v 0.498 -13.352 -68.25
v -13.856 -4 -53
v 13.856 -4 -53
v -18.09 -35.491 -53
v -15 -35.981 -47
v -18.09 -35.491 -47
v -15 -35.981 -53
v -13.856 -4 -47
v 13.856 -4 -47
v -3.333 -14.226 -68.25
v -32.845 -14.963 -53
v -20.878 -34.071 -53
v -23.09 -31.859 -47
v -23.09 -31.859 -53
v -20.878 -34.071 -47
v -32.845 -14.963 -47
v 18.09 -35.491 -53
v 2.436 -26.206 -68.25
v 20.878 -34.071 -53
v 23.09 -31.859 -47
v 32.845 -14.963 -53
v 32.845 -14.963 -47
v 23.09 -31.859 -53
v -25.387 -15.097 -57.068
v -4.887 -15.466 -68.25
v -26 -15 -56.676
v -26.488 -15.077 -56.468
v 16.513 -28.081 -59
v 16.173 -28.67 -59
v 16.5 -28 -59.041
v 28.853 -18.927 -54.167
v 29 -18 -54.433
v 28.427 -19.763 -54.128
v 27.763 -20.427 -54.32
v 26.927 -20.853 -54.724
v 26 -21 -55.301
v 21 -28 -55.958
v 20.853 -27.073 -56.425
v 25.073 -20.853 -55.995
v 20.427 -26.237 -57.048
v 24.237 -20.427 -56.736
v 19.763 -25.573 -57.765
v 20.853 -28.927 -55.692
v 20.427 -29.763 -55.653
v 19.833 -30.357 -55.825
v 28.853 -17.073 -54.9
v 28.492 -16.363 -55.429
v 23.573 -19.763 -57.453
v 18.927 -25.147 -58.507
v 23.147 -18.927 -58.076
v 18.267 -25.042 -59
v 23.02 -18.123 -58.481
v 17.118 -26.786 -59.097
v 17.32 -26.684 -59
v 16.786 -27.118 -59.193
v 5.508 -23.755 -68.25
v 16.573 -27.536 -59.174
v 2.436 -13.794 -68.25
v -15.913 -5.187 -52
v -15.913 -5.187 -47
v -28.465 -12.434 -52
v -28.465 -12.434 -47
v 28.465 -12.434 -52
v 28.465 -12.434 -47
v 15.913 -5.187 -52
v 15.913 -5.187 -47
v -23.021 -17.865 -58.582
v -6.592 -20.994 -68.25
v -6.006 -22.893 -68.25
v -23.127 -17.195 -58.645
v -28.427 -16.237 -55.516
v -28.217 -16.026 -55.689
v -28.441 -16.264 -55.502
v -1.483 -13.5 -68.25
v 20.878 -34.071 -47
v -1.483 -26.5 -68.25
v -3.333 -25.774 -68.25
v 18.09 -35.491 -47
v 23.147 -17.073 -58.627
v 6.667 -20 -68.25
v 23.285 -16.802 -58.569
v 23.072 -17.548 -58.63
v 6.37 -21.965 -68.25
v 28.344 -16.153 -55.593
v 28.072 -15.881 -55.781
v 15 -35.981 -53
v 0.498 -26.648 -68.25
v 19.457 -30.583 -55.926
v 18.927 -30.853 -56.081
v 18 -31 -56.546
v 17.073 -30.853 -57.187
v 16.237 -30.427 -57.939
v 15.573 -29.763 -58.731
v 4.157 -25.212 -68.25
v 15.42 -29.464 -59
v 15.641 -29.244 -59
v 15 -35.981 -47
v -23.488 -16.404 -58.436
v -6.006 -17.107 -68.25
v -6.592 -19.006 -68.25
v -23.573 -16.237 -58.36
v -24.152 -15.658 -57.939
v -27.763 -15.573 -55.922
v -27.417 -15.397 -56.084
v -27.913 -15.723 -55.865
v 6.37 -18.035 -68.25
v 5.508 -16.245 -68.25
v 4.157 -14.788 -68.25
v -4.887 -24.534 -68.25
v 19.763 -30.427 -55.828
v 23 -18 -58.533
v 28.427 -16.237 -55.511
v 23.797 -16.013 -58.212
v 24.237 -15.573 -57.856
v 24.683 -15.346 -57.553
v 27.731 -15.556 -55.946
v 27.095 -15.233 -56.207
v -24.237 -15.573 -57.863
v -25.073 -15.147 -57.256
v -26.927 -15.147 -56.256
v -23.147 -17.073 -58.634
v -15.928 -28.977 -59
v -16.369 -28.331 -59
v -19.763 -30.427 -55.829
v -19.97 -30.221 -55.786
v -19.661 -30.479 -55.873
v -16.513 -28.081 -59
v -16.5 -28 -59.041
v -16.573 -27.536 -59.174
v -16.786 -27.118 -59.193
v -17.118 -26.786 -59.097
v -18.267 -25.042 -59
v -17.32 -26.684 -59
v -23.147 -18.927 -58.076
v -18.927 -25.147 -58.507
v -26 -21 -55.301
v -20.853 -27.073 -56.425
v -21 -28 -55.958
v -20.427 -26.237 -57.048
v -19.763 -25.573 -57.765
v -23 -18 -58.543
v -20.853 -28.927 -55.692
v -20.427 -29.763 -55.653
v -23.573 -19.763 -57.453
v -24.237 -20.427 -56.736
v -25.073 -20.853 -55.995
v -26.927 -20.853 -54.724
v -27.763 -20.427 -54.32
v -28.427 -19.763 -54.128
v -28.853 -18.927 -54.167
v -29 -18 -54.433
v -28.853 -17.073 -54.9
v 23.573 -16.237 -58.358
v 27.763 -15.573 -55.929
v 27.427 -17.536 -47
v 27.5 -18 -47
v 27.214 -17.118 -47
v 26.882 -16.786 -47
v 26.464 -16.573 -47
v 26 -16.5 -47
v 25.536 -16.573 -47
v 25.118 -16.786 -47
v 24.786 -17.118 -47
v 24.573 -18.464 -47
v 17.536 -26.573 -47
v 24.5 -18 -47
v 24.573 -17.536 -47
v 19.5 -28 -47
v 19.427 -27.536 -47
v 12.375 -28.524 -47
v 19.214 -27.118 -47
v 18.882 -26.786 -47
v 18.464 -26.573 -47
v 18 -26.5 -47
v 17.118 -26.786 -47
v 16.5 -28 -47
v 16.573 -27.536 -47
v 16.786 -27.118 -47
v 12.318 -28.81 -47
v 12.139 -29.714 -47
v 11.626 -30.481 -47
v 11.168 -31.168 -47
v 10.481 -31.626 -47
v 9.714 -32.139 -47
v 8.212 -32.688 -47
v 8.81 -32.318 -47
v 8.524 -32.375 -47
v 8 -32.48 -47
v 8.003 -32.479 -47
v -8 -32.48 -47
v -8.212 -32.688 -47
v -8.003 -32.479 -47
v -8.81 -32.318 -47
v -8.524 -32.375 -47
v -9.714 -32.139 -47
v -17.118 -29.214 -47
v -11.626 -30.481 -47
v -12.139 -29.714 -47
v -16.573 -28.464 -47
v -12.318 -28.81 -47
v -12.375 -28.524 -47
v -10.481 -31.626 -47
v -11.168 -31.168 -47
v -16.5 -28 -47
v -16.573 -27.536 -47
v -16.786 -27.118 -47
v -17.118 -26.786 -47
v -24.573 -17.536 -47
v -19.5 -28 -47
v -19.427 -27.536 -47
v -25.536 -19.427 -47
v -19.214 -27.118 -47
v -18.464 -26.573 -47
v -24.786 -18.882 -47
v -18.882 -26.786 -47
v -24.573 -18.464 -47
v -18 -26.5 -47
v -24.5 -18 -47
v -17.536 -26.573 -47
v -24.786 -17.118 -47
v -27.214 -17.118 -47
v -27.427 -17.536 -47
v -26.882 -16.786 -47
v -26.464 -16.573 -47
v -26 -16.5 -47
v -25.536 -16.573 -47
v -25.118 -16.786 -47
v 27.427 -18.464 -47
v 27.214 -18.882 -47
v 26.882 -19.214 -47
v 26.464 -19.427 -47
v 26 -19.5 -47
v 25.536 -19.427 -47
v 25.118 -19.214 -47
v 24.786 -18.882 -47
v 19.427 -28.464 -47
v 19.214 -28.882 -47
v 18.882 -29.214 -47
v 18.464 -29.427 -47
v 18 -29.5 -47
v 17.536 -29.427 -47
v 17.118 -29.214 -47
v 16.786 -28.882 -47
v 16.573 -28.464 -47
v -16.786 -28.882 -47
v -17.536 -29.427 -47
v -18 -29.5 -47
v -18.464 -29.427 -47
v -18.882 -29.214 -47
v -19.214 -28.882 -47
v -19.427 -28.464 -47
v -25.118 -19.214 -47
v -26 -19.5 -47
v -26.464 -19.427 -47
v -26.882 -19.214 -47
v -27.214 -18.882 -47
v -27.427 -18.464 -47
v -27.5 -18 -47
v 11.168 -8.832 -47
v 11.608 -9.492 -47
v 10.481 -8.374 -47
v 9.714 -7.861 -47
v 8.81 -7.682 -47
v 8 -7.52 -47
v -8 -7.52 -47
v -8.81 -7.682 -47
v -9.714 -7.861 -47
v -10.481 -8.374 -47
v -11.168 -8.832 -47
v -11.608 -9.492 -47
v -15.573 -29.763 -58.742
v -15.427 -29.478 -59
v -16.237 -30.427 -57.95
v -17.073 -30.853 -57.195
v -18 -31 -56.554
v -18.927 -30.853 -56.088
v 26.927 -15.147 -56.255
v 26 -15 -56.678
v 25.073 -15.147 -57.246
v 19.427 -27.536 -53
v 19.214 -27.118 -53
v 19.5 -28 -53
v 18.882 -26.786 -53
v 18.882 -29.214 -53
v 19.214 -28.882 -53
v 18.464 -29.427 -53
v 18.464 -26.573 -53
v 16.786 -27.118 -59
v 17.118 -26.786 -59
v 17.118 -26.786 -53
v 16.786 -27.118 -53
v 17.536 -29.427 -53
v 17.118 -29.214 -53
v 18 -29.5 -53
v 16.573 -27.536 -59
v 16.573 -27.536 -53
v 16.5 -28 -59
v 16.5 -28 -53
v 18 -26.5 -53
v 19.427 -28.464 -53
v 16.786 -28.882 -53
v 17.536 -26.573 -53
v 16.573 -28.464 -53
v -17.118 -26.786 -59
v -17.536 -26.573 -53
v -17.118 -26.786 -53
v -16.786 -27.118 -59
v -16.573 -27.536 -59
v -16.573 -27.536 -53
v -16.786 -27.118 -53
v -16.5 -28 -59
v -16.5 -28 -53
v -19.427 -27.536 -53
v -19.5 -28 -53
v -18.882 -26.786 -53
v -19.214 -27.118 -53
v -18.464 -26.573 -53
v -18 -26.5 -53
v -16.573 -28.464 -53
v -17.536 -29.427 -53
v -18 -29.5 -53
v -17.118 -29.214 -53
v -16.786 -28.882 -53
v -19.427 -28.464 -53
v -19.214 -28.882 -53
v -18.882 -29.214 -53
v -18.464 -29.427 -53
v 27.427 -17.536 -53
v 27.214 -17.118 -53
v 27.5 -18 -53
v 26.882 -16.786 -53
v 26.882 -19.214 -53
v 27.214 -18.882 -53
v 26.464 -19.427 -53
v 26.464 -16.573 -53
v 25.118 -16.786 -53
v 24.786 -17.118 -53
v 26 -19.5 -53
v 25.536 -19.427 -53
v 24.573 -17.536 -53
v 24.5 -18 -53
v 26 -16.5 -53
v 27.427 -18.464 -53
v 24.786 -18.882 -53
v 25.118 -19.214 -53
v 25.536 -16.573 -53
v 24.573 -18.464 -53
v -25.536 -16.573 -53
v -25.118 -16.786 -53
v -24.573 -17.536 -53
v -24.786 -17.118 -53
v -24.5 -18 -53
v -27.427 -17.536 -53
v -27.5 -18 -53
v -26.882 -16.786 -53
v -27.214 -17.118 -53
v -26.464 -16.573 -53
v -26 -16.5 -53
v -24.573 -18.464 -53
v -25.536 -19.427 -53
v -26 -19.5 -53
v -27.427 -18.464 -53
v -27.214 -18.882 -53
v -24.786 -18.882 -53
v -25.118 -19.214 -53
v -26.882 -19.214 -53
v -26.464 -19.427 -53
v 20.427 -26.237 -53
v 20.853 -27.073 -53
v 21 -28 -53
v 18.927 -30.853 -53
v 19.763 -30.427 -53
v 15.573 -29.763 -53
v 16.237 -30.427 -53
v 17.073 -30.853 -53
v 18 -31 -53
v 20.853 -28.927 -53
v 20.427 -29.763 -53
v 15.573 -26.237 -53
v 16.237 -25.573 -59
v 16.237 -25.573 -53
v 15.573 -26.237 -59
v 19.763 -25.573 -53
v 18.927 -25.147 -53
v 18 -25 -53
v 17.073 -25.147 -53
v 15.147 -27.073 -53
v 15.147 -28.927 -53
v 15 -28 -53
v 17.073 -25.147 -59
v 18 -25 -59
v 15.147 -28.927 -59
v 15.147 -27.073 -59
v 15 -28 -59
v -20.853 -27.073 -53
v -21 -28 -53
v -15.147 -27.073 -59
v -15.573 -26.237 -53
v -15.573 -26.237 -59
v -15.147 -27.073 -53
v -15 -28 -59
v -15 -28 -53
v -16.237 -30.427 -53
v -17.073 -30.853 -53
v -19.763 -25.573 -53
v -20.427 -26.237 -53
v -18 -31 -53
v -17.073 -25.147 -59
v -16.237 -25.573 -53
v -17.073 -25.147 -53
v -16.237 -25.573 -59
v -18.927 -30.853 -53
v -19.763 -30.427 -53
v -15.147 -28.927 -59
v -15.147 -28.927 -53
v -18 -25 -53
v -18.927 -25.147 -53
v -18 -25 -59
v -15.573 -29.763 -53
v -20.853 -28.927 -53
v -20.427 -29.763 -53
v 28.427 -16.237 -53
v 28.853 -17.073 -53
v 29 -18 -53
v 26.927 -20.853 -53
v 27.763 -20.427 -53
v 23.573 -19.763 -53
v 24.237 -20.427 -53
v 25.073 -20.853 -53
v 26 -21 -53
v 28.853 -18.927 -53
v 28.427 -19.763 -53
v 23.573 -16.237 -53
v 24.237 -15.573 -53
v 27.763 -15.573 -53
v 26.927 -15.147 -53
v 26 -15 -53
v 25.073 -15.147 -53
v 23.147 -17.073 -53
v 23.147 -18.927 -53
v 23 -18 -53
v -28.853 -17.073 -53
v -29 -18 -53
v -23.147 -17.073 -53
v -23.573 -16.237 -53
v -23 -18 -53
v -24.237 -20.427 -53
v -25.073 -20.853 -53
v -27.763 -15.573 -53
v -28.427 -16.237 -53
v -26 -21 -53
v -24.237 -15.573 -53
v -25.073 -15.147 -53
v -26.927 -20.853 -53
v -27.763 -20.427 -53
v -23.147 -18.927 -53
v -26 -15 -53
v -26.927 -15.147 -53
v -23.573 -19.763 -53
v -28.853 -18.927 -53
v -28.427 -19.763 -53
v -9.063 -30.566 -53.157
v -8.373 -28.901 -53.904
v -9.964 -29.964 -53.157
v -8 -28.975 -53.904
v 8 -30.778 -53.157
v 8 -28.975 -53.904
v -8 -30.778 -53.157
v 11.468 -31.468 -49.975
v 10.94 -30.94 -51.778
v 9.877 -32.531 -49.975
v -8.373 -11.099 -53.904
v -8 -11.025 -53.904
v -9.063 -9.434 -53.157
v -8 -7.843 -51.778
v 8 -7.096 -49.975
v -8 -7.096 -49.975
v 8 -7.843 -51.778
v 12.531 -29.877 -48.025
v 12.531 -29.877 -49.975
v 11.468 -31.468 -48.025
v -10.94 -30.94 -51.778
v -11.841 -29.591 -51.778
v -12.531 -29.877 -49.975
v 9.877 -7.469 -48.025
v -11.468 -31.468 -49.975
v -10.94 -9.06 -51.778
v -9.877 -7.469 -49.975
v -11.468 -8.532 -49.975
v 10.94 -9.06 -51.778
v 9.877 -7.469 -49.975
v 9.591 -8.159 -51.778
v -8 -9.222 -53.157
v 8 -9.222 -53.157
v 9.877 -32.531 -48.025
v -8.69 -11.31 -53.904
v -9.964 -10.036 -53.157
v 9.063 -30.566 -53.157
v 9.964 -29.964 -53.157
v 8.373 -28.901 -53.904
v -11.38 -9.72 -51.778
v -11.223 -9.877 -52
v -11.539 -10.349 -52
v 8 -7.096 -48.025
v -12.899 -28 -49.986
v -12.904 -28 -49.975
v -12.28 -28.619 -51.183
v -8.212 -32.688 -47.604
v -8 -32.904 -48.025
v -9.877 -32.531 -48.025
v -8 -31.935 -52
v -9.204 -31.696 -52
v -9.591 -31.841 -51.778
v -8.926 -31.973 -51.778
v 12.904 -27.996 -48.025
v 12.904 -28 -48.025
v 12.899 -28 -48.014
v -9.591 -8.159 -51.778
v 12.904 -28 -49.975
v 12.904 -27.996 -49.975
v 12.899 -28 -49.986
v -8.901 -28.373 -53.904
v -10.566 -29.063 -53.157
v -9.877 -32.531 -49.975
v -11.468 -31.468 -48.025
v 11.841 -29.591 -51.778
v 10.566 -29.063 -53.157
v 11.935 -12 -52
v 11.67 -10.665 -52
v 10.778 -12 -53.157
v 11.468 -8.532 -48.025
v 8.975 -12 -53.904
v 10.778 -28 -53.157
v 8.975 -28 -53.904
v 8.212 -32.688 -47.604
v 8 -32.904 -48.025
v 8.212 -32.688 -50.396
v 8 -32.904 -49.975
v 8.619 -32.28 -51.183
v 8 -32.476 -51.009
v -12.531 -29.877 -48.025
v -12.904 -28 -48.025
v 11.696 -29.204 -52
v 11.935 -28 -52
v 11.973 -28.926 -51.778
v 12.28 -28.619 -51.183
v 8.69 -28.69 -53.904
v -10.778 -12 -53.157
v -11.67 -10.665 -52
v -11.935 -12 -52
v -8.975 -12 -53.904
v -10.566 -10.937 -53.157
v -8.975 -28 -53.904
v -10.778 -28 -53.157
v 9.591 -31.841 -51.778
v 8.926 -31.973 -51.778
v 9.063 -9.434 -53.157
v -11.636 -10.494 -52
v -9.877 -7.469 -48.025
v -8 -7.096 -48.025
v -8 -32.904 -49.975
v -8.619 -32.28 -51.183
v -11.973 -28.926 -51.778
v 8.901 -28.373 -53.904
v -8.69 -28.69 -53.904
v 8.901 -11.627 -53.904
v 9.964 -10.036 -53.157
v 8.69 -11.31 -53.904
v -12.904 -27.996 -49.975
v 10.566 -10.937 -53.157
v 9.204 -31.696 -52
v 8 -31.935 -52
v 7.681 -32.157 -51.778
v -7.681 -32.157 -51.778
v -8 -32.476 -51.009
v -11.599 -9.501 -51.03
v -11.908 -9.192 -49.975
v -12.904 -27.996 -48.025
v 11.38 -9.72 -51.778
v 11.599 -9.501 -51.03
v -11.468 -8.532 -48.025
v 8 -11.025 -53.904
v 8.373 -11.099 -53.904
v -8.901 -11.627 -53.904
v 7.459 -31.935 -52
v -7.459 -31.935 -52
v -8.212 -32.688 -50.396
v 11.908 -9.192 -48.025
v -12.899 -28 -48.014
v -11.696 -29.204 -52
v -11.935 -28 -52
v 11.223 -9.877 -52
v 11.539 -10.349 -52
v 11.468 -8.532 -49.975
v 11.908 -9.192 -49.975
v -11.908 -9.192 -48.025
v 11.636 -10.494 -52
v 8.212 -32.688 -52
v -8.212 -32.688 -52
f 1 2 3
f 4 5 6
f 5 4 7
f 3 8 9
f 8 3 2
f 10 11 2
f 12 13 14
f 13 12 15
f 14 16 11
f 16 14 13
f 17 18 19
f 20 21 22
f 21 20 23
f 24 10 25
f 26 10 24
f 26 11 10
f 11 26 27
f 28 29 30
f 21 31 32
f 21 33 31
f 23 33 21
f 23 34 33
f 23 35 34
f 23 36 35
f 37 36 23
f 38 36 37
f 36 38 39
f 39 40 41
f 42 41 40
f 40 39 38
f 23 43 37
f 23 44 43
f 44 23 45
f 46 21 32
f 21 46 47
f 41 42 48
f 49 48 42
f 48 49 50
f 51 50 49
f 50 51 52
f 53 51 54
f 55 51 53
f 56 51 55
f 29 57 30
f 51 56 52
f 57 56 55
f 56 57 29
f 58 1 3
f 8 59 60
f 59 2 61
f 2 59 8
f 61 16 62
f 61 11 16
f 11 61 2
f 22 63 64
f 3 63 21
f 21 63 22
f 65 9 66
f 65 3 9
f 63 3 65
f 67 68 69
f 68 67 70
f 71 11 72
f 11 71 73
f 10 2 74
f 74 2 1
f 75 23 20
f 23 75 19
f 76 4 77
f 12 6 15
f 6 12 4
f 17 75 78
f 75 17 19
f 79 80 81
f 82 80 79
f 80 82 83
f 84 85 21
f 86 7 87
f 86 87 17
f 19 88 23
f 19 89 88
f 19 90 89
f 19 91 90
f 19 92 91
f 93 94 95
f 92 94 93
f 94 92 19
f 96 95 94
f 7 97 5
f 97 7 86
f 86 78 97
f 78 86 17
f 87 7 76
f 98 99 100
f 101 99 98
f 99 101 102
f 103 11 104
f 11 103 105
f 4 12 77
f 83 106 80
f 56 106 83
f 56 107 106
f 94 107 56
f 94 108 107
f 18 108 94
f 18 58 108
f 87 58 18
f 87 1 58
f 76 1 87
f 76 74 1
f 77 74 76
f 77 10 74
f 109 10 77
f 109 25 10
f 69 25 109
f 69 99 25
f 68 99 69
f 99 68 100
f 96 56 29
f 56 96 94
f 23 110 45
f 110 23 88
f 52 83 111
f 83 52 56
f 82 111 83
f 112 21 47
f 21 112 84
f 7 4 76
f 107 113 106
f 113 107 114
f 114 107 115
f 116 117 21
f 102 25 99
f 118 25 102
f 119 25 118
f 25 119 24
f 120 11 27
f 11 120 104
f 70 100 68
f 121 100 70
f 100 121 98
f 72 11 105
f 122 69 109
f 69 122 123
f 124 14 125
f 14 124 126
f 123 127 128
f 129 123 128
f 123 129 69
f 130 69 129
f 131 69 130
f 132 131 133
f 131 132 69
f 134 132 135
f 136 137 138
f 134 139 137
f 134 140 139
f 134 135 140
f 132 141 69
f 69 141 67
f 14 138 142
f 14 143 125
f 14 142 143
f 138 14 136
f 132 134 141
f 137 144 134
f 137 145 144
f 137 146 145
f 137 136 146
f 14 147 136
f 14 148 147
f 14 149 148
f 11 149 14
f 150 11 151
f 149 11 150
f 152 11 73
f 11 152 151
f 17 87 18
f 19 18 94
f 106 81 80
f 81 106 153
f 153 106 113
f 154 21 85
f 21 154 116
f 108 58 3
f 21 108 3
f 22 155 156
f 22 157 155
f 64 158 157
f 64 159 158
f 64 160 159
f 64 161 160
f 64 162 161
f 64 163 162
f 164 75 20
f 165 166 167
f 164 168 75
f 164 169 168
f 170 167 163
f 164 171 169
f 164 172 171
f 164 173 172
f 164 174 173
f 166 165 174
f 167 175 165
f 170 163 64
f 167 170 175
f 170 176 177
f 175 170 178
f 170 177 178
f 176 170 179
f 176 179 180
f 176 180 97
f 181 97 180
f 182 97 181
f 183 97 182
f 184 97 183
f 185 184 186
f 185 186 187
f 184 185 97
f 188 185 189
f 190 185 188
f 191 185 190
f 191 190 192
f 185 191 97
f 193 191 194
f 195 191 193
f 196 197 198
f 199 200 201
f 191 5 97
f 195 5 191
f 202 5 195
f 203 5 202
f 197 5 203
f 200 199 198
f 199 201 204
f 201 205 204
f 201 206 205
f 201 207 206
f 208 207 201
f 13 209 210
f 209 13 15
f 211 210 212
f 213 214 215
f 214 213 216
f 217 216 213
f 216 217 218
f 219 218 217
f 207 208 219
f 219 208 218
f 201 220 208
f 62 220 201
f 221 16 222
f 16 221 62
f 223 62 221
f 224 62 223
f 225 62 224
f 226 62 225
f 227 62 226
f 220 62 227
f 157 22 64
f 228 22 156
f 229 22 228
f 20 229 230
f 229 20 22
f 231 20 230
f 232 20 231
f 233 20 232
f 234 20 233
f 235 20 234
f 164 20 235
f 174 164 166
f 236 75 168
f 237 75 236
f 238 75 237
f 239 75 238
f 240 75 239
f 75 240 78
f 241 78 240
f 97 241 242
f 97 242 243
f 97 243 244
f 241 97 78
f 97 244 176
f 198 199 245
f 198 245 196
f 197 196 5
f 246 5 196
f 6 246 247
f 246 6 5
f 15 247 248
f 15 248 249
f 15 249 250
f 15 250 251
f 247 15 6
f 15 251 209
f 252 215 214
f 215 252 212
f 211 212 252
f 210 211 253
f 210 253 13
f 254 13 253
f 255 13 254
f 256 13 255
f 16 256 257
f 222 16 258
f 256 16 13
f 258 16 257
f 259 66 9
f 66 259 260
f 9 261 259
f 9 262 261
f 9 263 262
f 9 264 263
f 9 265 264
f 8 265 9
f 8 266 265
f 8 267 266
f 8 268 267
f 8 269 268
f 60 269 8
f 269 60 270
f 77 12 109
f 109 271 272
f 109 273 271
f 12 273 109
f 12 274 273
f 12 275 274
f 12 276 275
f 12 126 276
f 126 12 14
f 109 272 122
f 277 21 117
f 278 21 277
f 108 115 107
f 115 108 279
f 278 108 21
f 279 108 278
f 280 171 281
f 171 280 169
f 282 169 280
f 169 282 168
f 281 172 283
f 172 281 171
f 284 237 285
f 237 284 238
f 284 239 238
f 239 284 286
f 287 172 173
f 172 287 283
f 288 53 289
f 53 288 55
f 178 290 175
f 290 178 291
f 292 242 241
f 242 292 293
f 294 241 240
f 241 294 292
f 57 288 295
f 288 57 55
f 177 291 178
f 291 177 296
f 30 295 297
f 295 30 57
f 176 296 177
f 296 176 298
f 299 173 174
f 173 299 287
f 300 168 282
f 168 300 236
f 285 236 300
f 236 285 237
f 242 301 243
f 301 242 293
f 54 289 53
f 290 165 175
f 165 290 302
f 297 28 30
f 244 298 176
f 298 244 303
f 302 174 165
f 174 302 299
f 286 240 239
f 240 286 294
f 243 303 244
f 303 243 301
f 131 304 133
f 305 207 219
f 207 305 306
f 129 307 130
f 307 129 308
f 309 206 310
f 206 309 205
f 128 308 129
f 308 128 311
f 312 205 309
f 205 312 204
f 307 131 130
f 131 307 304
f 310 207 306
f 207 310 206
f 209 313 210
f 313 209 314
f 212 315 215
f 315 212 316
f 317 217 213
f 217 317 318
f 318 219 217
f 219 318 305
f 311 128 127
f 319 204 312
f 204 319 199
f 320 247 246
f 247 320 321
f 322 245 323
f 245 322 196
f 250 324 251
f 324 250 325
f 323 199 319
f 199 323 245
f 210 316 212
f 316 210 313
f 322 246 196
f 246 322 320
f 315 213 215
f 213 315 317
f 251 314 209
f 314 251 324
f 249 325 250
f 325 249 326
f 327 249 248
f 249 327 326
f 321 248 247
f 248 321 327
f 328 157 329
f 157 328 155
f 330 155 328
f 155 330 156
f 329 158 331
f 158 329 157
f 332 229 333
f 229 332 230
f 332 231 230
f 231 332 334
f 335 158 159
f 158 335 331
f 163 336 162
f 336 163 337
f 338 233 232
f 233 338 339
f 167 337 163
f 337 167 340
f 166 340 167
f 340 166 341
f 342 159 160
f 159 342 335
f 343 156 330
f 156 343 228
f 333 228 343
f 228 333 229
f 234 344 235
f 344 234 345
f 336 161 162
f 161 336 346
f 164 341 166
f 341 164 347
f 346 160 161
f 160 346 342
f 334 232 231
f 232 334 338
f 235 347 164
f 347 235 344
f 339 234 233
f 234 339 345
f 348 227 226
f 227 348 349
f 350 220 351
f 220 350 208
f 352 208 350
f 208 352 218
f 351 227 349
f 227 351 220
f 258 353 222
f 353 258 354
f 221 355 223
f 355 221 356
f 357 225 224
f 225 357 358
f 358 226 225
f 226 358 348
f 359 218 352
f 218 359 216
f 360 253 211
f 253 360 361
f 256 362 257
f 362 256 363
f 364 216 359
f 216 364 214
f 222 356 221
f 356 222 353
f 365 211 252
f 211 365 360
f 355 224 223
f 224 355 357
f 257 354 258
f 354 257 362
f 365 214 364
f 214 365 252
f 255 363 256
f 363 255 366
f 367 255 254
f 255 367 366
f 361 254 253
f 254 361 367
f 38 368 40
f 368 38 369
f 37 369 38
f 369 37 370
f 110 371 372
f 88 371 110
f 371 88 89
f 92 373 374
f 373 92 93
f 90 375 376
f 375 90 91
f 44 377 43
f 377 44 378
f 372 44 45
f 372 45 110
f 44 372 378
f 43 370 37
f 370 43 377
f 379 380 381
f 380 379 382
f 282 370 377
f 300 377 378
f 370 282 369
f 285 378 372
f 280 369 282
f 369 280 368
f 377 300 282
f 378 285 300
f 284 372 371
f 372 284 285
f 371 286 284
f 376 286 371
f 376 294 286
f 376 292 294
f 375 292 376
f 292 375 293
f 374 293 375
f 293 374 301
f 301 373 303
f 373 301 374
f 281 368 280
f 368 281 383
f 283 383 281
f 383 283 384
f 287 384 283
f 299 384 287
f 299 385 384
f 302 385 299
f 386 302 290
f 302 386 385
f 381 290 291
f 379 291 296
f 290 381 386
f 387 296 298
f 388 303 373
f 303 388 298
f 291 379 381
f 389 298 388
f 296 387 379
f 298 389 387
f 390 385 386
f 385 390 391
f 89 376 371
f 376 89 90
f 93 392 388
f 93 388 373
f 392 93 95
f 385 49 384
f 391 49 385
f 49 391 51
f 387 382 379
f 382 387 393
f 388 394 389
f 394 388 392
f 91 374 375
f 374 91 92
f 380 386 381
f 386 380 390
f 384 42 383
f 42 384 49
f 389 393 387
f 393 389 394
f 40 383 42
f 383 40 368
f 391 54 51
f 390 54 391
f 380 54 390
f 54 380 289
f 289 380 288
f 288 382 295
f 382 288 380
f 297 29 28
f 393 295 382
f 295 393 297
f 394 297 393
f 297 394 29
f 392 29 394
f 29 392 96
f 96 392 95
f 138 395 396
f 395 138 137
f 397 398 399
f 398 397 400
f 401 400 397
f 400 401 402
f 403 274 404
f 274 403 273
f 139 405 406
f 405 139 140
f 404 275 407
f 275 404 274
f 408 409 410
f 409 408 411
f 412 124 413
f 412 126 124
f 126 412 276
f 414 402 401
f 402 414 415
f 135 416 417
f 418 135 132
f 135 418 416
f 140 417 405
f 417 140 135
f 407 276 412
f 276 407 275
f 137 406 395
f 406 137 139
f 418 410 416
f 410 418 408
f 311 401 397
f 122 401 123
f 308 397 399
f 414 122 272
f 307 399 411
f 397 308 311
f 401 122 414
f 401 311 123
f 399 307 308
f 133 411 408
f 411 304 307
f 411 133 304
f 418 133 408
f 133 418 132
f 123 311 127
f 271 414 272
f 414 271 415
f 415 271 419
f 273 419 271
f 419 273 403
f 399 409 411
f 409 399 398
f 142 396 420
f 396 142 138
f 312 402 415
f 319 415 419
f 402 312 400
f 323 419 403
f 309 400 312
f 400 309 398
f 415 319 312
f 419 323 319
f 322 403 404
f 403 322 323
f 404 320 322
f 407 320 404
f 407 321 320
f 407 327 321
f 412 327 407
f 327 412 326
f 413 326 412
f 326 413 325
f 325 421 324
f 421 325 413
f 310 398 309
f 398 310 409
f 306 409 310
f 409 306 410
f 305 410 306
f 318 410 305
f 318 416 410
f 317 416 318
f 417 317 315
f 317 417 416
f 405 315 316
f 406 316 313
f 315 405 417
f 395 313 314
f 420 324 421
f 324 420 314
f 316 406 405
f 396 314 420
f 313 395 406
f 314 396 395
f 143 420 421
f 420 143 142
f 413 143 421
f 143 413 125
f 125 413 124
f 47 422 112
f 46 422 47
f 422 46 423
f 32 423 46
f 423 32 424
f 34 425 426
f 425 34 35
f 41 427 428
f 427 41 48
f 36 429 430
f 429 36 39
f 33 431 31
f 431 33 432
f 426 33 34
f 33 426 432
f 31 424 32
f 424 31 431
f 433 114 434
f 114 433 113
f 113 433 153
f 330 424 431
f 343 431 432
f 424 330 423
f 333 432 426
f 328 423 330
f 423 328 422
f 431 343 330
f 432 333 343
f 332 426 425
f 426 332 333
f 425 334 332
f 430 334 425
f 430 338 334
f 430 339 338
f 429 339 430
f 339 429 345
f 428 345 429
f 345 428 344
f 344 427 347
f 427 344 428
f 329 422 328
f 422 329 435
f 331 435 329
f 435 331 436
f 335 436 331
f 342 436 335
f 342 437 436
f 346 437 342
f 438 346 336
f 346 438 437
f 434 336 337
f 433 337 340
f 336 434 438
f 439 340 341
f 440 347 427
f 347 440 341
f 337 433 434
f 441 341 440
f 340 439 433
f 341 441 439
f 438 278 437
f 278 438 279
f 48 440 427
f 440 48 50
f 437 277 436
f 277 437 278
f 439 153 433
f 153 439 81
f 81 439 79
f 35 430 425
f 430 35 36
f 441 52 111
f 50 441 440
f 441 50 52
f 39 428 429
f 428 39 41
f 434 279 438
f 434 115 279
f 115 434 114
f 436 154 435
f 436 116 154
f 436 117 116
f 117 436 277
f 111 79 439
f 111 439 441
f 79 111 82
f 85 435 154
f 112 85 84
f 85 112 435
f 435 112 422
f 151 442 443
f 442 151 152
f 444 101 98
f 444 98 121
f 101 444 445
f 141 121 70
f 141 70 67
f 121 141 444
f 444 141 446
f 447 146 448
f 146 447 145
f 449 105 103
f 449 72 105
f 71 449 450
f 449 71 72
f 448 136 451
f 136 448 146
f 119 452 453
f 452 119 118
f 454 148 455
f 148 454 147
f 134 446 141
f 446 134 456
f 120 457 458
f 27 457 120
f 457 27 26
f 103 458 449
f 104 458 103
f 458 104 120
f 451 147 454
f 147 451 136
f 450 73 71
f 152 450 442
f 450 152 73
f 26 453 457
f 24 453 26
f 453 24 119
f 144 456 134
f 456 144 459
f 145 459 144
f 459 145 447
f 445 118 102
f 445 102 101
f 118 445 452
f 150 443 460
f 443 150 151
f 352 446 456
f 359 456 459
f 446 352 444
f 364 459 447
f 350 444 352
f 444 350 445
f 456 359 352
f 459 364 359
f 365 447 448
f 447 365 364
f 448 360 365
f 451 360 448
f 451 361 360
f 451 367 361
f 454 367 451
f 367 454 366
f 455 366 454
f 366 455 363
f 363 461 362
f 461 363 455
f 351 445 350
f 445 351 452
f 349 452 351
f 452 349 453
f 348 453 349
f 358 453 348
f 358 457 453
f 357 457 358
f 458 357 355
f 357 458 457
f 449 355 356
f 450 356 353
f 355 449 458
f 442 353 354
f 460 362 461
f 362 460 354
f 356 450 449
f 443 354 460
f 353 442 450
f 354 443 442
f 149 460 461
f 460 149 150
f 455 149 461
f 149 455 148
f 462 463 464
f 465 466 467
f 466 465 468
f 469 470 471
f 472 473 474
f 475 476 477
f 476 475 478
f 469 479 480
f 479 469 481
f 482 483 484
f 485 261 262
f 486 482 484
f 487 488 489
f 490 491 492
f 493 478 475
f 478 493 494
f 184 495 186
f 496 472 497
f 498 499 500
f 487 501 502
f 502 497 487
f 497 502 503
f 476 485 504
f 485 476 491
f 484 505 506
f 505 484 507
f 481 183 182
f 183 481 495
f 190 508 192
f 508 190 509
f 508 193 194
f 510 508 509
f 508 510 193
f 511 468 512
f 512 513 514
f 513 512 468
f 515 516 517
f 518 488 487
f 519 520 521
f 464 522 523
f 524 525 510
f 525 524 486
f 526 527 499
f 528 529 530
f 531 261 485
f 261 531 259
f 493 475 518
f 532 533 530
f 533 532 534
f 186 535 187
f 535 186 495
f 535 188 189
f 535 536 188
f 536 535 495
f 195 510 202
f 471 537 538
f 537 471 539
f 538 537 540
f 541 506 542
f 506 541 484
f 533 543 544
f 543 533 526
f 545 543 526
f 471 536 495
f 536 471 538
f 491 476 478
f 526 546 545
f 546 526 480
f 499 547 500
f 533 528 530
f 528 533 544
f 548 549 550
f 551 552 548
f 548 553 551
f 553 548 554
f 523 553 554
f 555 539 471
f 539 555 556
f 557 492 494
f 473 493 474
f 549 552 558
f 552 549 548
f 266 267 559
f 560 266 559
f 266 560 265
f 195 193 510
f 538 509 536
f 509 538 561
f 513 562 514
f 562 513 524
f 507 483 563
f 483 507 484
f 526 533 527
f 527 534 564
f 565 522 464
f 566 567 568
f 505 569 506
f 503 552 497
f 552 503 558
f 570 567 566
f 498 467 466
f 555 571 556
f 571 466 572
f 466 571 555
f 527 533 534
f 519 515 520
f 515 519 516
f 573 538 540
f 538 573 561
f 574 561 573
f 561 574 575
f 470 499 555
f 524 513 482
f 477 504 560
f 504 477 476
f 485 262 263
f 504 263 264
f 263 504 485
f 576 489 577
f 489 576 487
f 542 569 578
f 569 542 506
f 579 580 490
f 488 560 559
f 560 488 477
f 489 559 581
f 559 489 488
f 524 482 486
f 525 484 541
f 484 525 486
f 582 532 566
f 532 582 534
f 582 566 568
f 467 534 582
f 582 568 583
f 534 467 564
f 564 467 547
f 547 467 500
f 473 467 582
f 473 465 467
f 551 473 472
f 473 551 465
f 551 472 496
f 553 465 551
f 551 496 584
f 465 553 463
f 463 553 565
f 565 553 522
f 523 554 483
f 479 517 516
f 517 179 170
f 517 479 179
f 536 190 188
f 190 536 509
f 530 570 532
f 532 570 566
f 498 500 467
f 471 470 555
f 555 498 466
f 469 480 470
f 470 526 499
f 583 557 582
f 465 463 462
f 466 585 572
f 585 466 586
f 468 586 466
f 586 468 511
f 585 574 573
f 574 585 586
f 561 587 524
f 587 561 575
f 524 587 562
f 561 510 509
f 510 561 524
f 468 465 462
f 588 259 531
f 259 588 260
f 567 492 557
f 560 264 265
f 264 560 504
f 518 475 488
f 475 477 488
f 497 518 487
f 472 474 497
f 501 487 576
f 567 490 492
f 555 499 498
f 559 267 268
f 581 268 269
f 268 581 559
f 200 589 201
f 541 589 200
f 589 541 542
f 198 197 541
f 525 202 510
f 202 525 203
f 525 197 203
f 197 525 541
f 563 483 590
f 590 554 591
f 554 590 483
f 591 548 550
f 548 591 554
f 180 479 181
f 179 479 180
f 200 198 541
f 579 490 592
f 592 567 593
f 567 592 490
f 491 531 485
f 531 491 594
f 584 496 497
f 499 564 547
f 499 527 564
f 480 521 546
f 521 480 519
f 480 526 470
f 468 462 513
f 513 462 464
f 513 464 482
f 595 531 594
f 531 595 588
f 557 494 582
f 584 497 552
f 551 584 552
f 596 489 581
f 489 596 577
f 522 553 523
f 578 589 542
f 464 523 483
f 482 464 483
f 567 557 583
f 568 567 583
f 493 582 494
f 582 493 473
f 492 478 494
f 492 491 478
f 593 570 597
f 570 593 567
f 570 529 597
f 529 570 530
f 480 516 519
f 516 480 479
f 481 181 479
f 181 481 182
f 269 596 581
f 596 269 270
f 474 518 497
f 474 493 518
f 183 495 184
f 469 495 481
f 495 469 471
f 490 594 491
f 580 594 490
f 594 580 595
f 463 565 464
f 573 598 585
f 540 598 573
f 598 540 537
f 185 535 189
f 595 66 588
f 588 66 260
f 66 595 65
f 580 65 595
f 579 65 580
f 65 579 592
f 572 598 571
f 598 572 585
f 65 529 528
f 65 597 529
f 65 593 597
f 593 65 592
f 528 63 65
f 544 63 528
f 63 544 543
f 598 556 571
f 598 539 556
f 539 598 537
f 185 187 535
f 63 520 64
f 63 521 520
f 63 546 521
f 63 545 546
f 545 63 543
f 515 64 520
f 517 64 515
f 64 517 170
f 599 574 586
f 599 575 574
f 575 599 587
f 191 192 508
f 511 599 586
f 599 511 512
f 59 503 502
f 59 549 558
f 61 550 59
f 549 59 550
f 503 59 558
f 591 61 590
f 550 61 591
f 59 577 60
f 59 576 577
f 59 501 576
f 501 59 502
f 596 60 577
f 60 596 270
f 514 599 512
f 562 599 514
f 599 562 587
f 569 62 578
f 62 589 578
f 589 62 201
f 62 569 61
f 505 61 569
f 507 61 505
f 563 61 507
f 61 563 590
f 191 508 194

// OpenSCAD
//This is based on the Atom 3dp design

extrusion = 20;
err = 0.2;
channelWidth= 4;
channelWidthInside=8.5;
channelDeep = 6;

outRoundness = .5*extrusion;
innerRoundness = 0.2*extrusion;
endRoundness = 0.08* extrusion;

armLength = extrusion * 2.7;


//height = extrusion;

sqrt3 = 1.7321;

m25ScrewRadius = 1.25; 

m4ScrewRadius = 2.0; //for M4 bolt
m4ScrewHeadRadius = 4.0; 
m4NutRadius = 4.3;

m5NutRadius = 8/sqrt3+0.2;

m3ScrewRadius = 1.5; //for M3 bolt
m3ScrewHeadRadius = 3.0; 
m3NutRadius = 3.5; //


module bottomCover(height){
    // draw the basic shape

    difference(){
	hull(){
	    intersection(){
		minkowski() {
		    cylinder(r=extrusion*1.5, h=0.3*height,  center=true,$fn=6);
		    cylinder(r=outRoundness, h=0.3*height, center=true, $fn=20);
		}
		translate([0,-extrusion*1.8,0]) rotate([0,0,30]) cylinder(r=extrusion*2,h=0.3*height, center=true, $fn=6);
		translate([0,-1.2*extrusion,0]) cube([4*extrusion, 2*extrusion, 2*height],center=true);
	    }
	    translate([0,-extrusion, -height*.9]) cylinder(r=extrusion/3,h=0.5,center=true);//cube([extrusion+5, extrusion+5, 0.5],center=true);
	}
    
	// leave holes for m3 screws
	translate([0.9*extrusion, -1.4*extrusion,0]) cylinder(r=m3ScrewRadius, h=extrusion, center=true, $fn=20);
	translate([-0.9*extrusion, -1.4*extrusion,0]) cylinder(r=m3ScrewRadius, h=extrusion, center=true, $fn=20);
	translate([1.3*extrusion, -0.9*extrusion,0]) cylinder(r=m3ScrewRadius, h=extrusion, center=true, $fn=20);
	translate([-1.3*extrusion, -0.9*extrusion,0]) cylinder(r=m3ScrewRadius, h=extrusion, center=true, $fn=20);

	// Leave holes for m3 head

	translate([0.9*extrusion, -1.4*extrusion,-.3*extrusion]) cylinder(r=m3ScrewHeadRadius, h=extrusion*.3, center=true, $fn=20);
	translate([-0.9*extrusion, -1.4*extrusion,-.3*extrusion]) cylinder(r=m3ScrewHeadRadius, h=extrusion*.3, center=true, $fn=20);
	translate([1.3*extrusion, -0.9*extrusion,-.3*extrusion]) cylinder(r=m3ScrewHeadRadius, h=extrusion*.3, center=true, $fn=20);
	translate([-1.3*extrusion, -0.9*extrusion,-.3*extrusion]) cylinder(r=m3ScrewHeadRadius, h=extrusion*.3, center=true, $fn=20);

	// Leave space for wiring

	translate([0,-extrusion,0.15*extrusion])
	hull(){
	    for(i=[0:90:270])
	    rotate([0,0,i]) translate([extrusion*.4,extrusion*.4,-2])sphere(r=0.25*extrusion, center=true);

	    //translate([0, -extrusion*.5,0.17*extrusion]) scale([1,1.3,0.5])sphere(r=0.34*extrusion, center=true);
	    //	    translate([0.7*extrusion,-0.6*extrusion,channelDeep/2-1])cube([extrusion,channelWidth*2, channelDeep],center=true);
	    //	    translate([-0.7*extrusion,-0.6*extrusion,channelDeep/2-1])cube([extrusion,channelWidth*2, channelDeep],center=true);
	    
	}

	translate([0.75*extrusion,-0.8*extrusion,channelDeep/2-2]) rotate([0,0,45])
	cube([1.66*extrusion,channelWidth*3.5, channelDeep],center=true);
	
	translate([-0.75*extrusion,-0.8*extrusion,channelDeep/2-2]) rotate([0,0,-45])
	cube([1.66*extrusion,channelWidth*3.5, channelDeep],center=true);


//translate([0,0.3*extrusion,0.1*extrusion]) cube([0.5*extrusion,2*extrusion,0.2*extrusion],center=true);
	translate([0, extrusion, 0]) rotate([10,0,0])cube([0.5*extrusion, extrusion*1.5, 0.2*extrusion],center=true);

	
    }

}



module topCover(height){
    // draw the basic shape
    intersection(){
	// to give a nicer cover
	translate([0,-extrusion,0])
	union(){
	    //translate([0,1,0])cylinder(r=0.9*extrusion, h=extrusion,center=true,$fn=30);
	    translate([0,-0.25*extrusion,0])cube([4*extrusion,2*extrusion,extrusion],center=true);
	}

	// real main shape
	difference(){
	    hull(){
		intersection(){
		    minkowski() {
			cylinder(r=extrusion*1.5, h=0.3*height,  center=true,$fn=6);
			cylinder(r=outRoundness, h=0.3*height, center=true, $fn=20);
		    }
		    translate([0,-extrusion*1.8,0]) rotate([0,0,30]) cylinder(r=extrusion*2,h=0.3*height, center=true, $fn=6);
		}
		translate([0,-extrusion, height*.6]) cylinder(r=extrusion*.6,h=0.5,center=true);//cube([extrusion+5, extrusion+5, 0.5],center=true);
		
	    }
	    // leave holes for m3 screws
	    translate([0.9*extrusion, -1.4*extrusion,0]) cylinder(r=m3ScrewRadius, h=extrusion, center=true, $fn=20);
	    translate([-0.9*extrusion, -1.4*extrusion,0]) cylinder(r=m3ScrewRadius, h=extrusion, center=true, $fn=20);
	    translate([1.3*extrusion, -0.9*extrusion,0]) cylinder(r=m3ScrewRadius, h=extrusion, center=true, $fn=20);
	    translate([-1.3*extrusion, -0.9*extrusion,0]) cylinder(r=m3ScrewRadius, h=extrusion, center=true, $fn=20);
	    
	    // Leave holes for m3 head
	    
	    translate([0.9*extrusion, -1.4*extrusion,.7*height]) cylinder(r=m3ScrewHeadRadius, h=extrusion*.3, center=true, $fn=20);
	    translate([-0.9*extrusion, -1.4*extrusion,.7*height]) cylinder(r=m3ScrewHeadRadius, h=extrusion*.3, center=true, $fn=20);
	    translate([1.3*extrusion, -0.9*extrusion,.7*height]) cylinder(r=m3ScrewHeadRadius, h=extrusion*.3, center=true, $fn=20);
	    translate([-1.3*extrusion, -0.9*extrusion,.7*height]) cylinder(r=m3ScrewHeadRadius, h=extrusion*.3, center=true, $fn=20);
	    
	    // Leave space for wiring
	    
	    translate([0,-extrusion,0])
	    for(i=[0:90:270])
	    rotate([0,0,i]) translate([extrusion*.45,extrusion*.45,-.7*height])sphere(r=0.27*extrusion, center=true);

	    translate([0, -extrusion*.5, -.5*height]) sphere(r=0.3*extrusion, center=true);
	    
	}
    }
}


module frameShape(height){
    union(){
	// vertex side
	intersection(){
	    minkowski() {
		cylinder(r=extrusion*1.5, h=height, center=true,$fn=6);
		cylinder(r=outRoundness, h=height, center=true, $fn=20);
	    }
	    translate([0,-extrusion*1.8,0]) rotate([0,0,30]) cylinder(r=extrusion*2, h=height,center=true, $fn=6);
	}

	// V part
	translate([0,armLength-1.6*extrusion,0]) rotate([0,0,30])
	minkowski(){
	    cylinder(r=armLength-endRoundness*2, h=height-1, center=true, $fn=3);
	    cylinder(r=endRoundness, h=1, center=true, $fn=20);
	}

	// bump
//	bump(height);
    }
}

module extrusion(length){
    difference(){
	cube([extrusion+0.2,extrusion+0.2, length], center=true);
	for(i=[0:90:270]) 
	rotate([0,0,i]) translate([extrusion/2,0,0]) cube([channelWidth-err,channelWidth-err, length], center=true);
    }
    for (i=[0:90:270])
    rotate([0,0,i])translate([extrusion/2,extrusion/2,0])cylinder(r=1,h=length,center=true);

}

module frameGeneral(height){
//    union(){
	difference(){
	    frameShape(height);
	    
	    // vertical extrusion place
	    translate([0,-extrusion,0]) extrusion(height+100);
	    // dig hole for belt or gear
	    
	    translate([0, .5*extrusion,0])
	    minkowski(){
		intersection(){
		    rotate([0,0,30]) cylinder(r=1.1*extrusion, h=height*2,center=true, $fn=3);
		    cube([extrusion*2,  extrusion, height*2],center=true);
		}
		cylinder(r=innerRoundness, h=height, center=true, $fn=20);
		
	    }
	    
	    // make V shape branches
	    translate([0, 2.2*extrusion,0])
	    minkowski(){
		intersection(){
		    rotate([0,0,30]) cylinder(r=extrusion*2.8, h=height,center=true, $fn=3);
		    cube([extrusion*5,  extrusion, height],center=true);
		}
		cylinder(r=innerRoundness, h=height, center=true, $fn=20);
	    }
	}
	
   // }

}

//%rotate([0,0, -30]) translate([1.3*extrusion,2.7*extrusion,0]) rotate([90,0,0]) extrusion(100);//cube([extrusion, 100, extrusion]);
//%rotate([0,0, 30]) translate([-1.3*extrusion,2.7*extrusion,0]) rotate([90,0,0]) extrusion(100);


module frame_top(){
    difference(){
	union(){
	    frameGeneral(extrusion);
	    
	    // add bumps for bearing
	    intersection(){
		rotate([-90,0,0]) cylinder(r1 = extrusion*.8, r2=0.1*extrusion, h= 0.6*extrusion,center=true);
		cube([2*extrusion, 2* extrusion, extrusion],center=true);
	    }
	    translate([0,extrusion*1.15,0]) intersection(){
		rotate([90,0,0]) cylinder(r1 = extrusion*.6, r2=0.1*extrusion, h= 0.4*extrusion,center=true);
		cube([2*extrusion, 2* extrusion, extrusion],center=true);
	    }
	    
	    // add horizontal bumps strips
	    rotate([0,0,-30])translate([extrusion*.75,0,0])rotate([-90,0,0])cylinder(r=channelWidth/2+err, h=3.2*extrusion,$fn=20);
	    rotate([0,0,30])translate([-extrusion*.75,0,0])rotate([-90,0,0])cylinder(r=channelWidth/2+err, h=3.2*extrusion,$fn=20);
	}

	// leave m3 screw
	rotate([-90,0,0]) cylinder(r=m3ScrewRadius, h=3*extrusion, $fn=20);
	rotate([-90,0,0]) translate([0,0, 1.5*extrusion-3.5]) cylinder(r=m3ScrewHeadRadius, h=3.6,$fn=20);

	// Vertical extrusion mounting M4 screws
	translate([0, -extrusion,0])rotate([90,0,0]) cylinder(r=m4ScrewRadius, h= extrusion, $fn=20);
	translate([0, -1.6*extrusion,0])rotate([90,0,0]) cylinder(r=m4ScrewHeadRadius, h= 4, $fn=20);
	translate([0, -1.3*extrusion,0])rotate([90,0,0]) cylinder(r=m4NutRadius+0.5, h= 4, $fn=6);

	// Aluminum mount screws
	rotate([0,0,30]){
	    translate([-extrusion,0.7*extrusion,0])rotate([0,90,0]) cylinder(r=m4ScrewRadius, h = extrusion, $fn=20);
	    translate([-0.65*extrusion,0.7*extrusion,0])rotate([0,90,0]) cylinder(r=m4ScrewHeadRadius, h = 4, $fn=20);
	    translate([-1.02*extrusion,0.7*extrusion,0])rotate([0,90,0]) cylinder(r=m4NutRadius, h = 4, $fn=6);
	    
	    translate([-extrusion,2.8*extrusion,0])rotate([0,90,0]) cylinder(r=m4ScrewRadius, h = extrusion, $fn=20);
	    translate([-0.65*extrusion,2.8*extrusion,0])rotate([0,90,0]) cylinder(r=m4ScrewHeadRadius, h = 4, $fn=20);
	    translate([-1.02*extrusion,2.8*extrusion,0])rotate([0,90,0]) cylinder(r=m4NutRadius, h = 4, $fn=6);
	}


	rotate([0,0,-30]){
	    translate([extrusion,0.7*extrusion,0])rotate([0,-90,0]) cylinder(r=m4ScrewRadius, h = extrusion, $fn=20);
	    translate([0.65*extrusion,0.7*extrusion,0])rotate([0,-90,0]) cylinder(r=m4ScrewHeadRadius, h = 4, $fn=20);
	    translate([1.02*extrusion,0.7*extrusion,0])rotate([0,-90,0]) cylinder(r=m4NutRadius, h = 4, $fn=6);
	    
	    translate([extrusion,2.8*extrusion,0])rotate([0,-90,0]) cylinder(r=m4ScrewRadius, h = extrusion, $fn=20);
	    translate([0.65*extrusion,2.8*extrusion,0])rotate([0,-90,0]) cylinder(r=m4ScrewHeadRadius, h = 4, $fn=20);
	    translate([1.02*extrusion,2.8*extrusion,0])rotate([0,-90,0]) cylinder(r=m4NutRadius, h = 4, $fn=6);
	}

	// long m3 screw
	translate([0,-0.4*extrusion,0])rotate([13,0,0]){
	    cylinder(r=m3ScrewRadius, h= 2*extrusion, center=true,$fn=20);
	    translate([0,0,0.5*extrusion])cylinder(r=m3ScrewHeadRadius, h=5, center=true, $fn=20);
	    translate([0,0,-0.45*extrusion])cylinder(r=m3NutRadius+err, h=0.5*extrusion, center=true, $fn=6);
	}

	// slots for putting nuts

	rotate([0,0,-30])translate([1.3*extrusion,extrusion*.5,extrusion/2-channelDeep/2+1]){
	    translate([0,-extrusion/2,0])cylinder(r=channelWidthInside/2, h= channelDeep,center=true);
	    cube([channelWidthInside, extrusion,channelDeep],center=true);
	}

    	rotate([0,0,-30])translate([1.3*extrusion,extrusion*.5,-extrusion/2+channelDeep/2-1]){
	    translate([0,-extrusion/2,0])cylinder(r=channelWidthInside/2, h= channelDeep,center=true);
	    cube([channelWidthInside, extrusion,channelDeep],center=true);
	}

	rotate([0,0,30])translate([-1.3*extrusion,extrusion*.5,extrusion/2-channelDeep/2+1]){
	    translate([0,-extrusion/2,0])cylinder(r=channelWidthInside/2, h= channelDeep,center=true);
	    cube([channelWidthInside, extrusion,channelDeep],center=true);
	}

    	rotate([0,0,30])translate([-1.3*extrusion,extrusion*.5,-extrusion/2+channelDeep/2-1]){
	    translate([0,-extrusion/2,0])cylinder(r=channelWidthInside/2, h= channelDeep,center=true);
	    cube([channelWidthInside, extrusion,channelDeep],center=true);
	}

	//slots for wires
	translate([0.7*extrusion,-0.63*extrusion,0.5*extrusion-channelDeep/2+1])cube([extrusion,channelWidth, channelDeep],center=true);
	translate([-0.7*extrusion,-0.63*extrusion,0.5*extrusion-channelDeep/2+1])cube([extrusion,channelWidth, channelDeep],center=true);


	translate([0.7*extrusion,-1.07*extrusion,0.5*extrusion-channelDeep/2+1]) rotate([0,0,45]) cube([extrusion,channelWidth, channelDeep],center=true);
	translate([-0.7*extrusion,-1.07*extrusion,0.5*extrusion-channelDeep/2+1]) rotate([0,0,-45]) cube([extrusion,channelWidth, channelDeep],center=true);


	// screw holes for cover the top
	translate([0.9*extrusion, -1.4*extrusion,extrusion/2]) cylinder(r=m3ScrewRadius, h=1.8*extrusion, center=true, $fn=20);
	translate([-0.9*extrusion, -1.4*extrusion,extrusion/2]) cylinder(r=m3ScrewRadius, h=1.8*extrusion, center=true, $fn=20);


	translate([1.3*extrusion, -0.9*extrusion,extrusion/2]) cylinder(r=m3ScrewRadius, h=1.8*extrusion, center=true, $fn=20);
	translate([-1.3*extrusion, -0.9*extrusion,extrusion/2]) cylinder(r=m3ScrewRadius, h=1.8*extrusion, center=true, $fn=20);

    }
}



module frame_motor(){
        difference(){
	union(){
	    frameGeneral(extrusion*2.5);
	    
	    // add horizontal bumps strips
	    rotate([0,0,-30])translate([extrusion*.75,0,.75*extrusion])rotate([-90,0,0])cylinder(r=channelWidth/2+err, h=3.2*extrusion,$fn=20);
	    rotate([0,0,30])translate([-extrusion*.75,0,.75*extrusion])rotate([-90,0,0])cylinder(r=channelWidth/2+err, h=3.2*extrusion,$fn=20);

	    rotate([0,0,-30])translate([extrusion*.75,0,-.75*extrusion])rotate([-90,0,0])cylinder(r=channelWidth/2+err, h=3.2*extrusion,$fn=20);
	    rotate([0,0,30])translate([-extrusion*.75,0,-.75*extrusion])rotate([-90,0,0])cylinder(r=channelWidth/2+err, h=3.2*extrusion,$fn=20);
	}

	// Motor hole
	translate([0,extrusion,0])rotate([90,0,0]) cylinder(r=12, h=extrusion*2, center=true,$fn=20);
	for(i=[0:90:270])
	rotate([0,i,0])
	translate([31/2,extrusion*1.5,31/2])
	rotate([90,0,0]){
	    cylinder(r=m3ScrewRadius, h= extrusion, center=true, $fn=20);
	    translate([0,0,4])cylinder(r=m3ScrewHeadRadius,h=1.1*extrusion,  $fn=20);
	}
	// for easier assembling
	translate([31/2,extrusion,31/2]) rotate([0,-35,0])rotate([-15,0,0])rotate([90,0,0])cylinder(r=m3ScrewRadius+1, h =5*extrusion, $fn=20);
	translate([31/2,extrusion,-31/2]) rotate([0,35,0])rotate([15,0,0])rotate([90,0,0])cylinder(r=m3ScrewRadius+1, h =5*extrusion, $fn=20);
	translate([-31/2,extrusion,-31/2]) rotate([0,-35,0])rotate([15,0,0])rotate([90,0,0])cylinder(r=m3ScrewRadius+1, h =5*extrusion, $fn=20);
	translate([-31/2,extrusion,31/2]) rotate([0,35,0])rotate([-15,0,0])rotate([90,0,0])cylinder(r=m3ScrewRadius+1, h =5*extrusion, $fn=20);


	%translate([31/2,extrusion,31/2]) rotate([0,-35,0])rotate([-15,0,0])rotate([90,0,0])cylinder(r=m3ScrewRadius, h =5*extrusion, $fn=20);
	%translate([31/2,extrusion,-31/2]) rotate([0,35,0])rotate([15,0,0])rotate([90,0,0])cylinder(r=m3ScrewRadius, h =5*extrusion, $fn=20);
	%translate([-31/2,extrusion,-31/2]) rotate([0,-35,0])rotate([15,0,0])rotate([90,0,0])cylinder(r=m3ScrewRadius, h =5*extrusion, $fn=20);
	%translate([-31/2,extrusion,31/2]) rotate([0,35,0])rotate([-15,0,0])rotate([90,0,0])cylinder(r=m3ScrewRadius, h =5*extrusion, $fn=20);

	
	// Vertical extrusion mounting M4 screws
	translate([0, -extrusion,.75*extrusion])rotate([90,0,0]) cylinder(r=m4ScrewRadius, h= extrusion, $fn=20);
	translate([0, -1.6*extrusion,.75*extrusion])rotate([90,0,0]) cylinder(r=m4ScrewHeadRadius, h= 4, $fn=20);
	translate([0, -1.3*extrusion,.75*extrusion])rotate([90,0,0]) cylinder(r=m4NutRadius+0.5, h= 4, $fn=6);


	translate([0, -extrusion,-.75*extrusion])rotate([90,0,0]) cylinder(r=m4ScrewRadius, h= extrusion, $fn=20);
	translate([0, -1.6*extrusion,-.75*extrusion])rotate([90,0,0]) cylinder(r=m4ScrewHeadRadius, h= 4, $fn=20);
	translate([0, -1.3*extrusion,-.75*extrusion])rotate([90,0,0]) cylinder(r=m4NutRadius+0.5, h= 4, $fn=6);

	
	// Aluminum mounting screws
	rotate([0,0,30]){
	    translate([-extrusion,0.7*extrusion,.75*extrusion])rotate([0,90,0]) cylinder(r=m4ScrewRadius, h = extrusion, $fn=20);
	    translate([-0.65*extrusion,0.7*extrusion,.75*extrusion])rotate([0,90,0]) cylinder(r=m4ScrewHeadRadius, h = 4, $fn=20);
	    translate([-1.02*extrusion,0.7*extrusion,.75*extrusion])rotate([0,90,0]) cylinder(r=m4NutRadius, h = 4, $fn=6);
	    
	    translate([-extrusion,2.8*extrusion,.75*extrusion])rotate([0,90,0]) cylinder(r=m4ScrewRadius, h = extrusion, $fn=20);
	    translate([-0.65*extrusion,2.8*extrusion,.75*extrusion])rotate([0,90,0]) cylinder(r=m4ScrewHeadRadius, h = 4, $fn=20);
	    translate([-1.02*extrusion,2.8*extrusion,.75*extrusion])rotate([0,90,0]) cylinder(r=m4NutRadius, h = 4, $fn=6);
	}

	rotate([0,0,30]){
	    translate([-extrusion,0.7*extrusion,-.75*extrusion])rotate([0,90,0]) cylinder(r=m4ScrewRadius, h = extrusion, $fn=20);
	    translate([-0.65*extrusion,0.7*extrusion,-.75*extrusion])rotate([0,90,0]) cylinder(r=m4ScrewHeadRadius, h = 4, $fn=20);
	    translate([-1.02*extrusion,0.7*extrusion,-.75*extrusion])rotate([0,90,0]) cylinder(r=m4NutRadius, h = 4, $fn=6);
	    
	    translate([-extrusion,2.8*extrusion,-.75*extrusion])rotate([0,90,0]) cylinder(r=m4ScrewRadius, h = extrusion, $fn=20);
	    translate([-0.65*extrusion,2.8*extrusion,-.75*extrusion])rotate([0,90,0]) cylinder(r=m4ScrewHeadRadius, h = 4, $fn=20);
	    translate([-1.02*extrusion,2.8*extrusion,-.75*extrusion])rotate([0,90,0]) cylinder(r=m4NutRadius, h = 4, $fn=6);
	}

	
	rotate([0,0,-30]){
	    translate([extrusion,0.7*extrusion,.75*extrusion])rotate([0,-90,0]) cylinder(r=m4ScrewRadius, h = extrusion, $fn=20);
	    translate([0.65*extrusion,0.7*extrusion,.75*extrusion])rotate([0,-90,0]) cylinder(r=m4ScrewHeadRadius, h = 4, $fn=20);
	    translate([1.02*extrusion,0.7*extrusion,.75*extrusion])rotate([0,-90,0]) cylinder(r=m4NutRadius, h = 4, $fn=6);
	    
	    translate([extrusion,2.8*extrusion,.75*extrusion])rotate([0,-90,0]) cylinder(r=m4ScrewRadius, h = extrusion, $fn=20);
	    translate([0.65*extrusion,2.8*extrusion,.75*extrusion])rotate([0,-90,0]) cylinder(r=m4ScrewHeadRadius, h = 4, $fn=20);
	    translate([1.02*extrusion,2.8*extrusion,.75*extrusion])rotate([0,-90,0]) cylinder(r=m4NutRadius, h = 4, $fn=6);
	}


	rotate([0,0,-30]){
	    translate([extrusion,0.7*extrusion,-.75*extrusion])rotate([0,-90,0]) cylinder(r=m4ScrewRadius, h = extrusion, $fn=20);
	    translate([0.65*extrusion,0.7*extrusion,-.75*extrusion])rotate([0,-90,0]) cylinder(r=m4ScrewHeadRadius, h = 4, $fn=20);
	    translate([1.02*extrusion,0.7*extrusion,-.75*extrusion])rotate([0,-90,0]) cylinder(r=m4NutRadius, h = 4, $fn=6);
	    
	    translate([extrusion,2.8*extrusion,-.75*extrusion])rotate([0,-90,0]) cylinder(r=m4ScrewRadius, h = extrusion, $fn=20);
	    translate([0.65*extrusion,2.8*extrusion,-.75*extrusion])rotate([0,-90,0]) cylinder(r=m4ScrewHeadRadius, h = 4, $fn=20);
	    translate([1.02*extrusion,2.8*extrusion,-.75*extrusion])rotate([0,-90,0]) cylinder(r=m4NutRadius, h = 4, $fn=6);
	}

	
	// sluts for putting nuts

	rotate([0,0,-30])translate([1.3*extrusion,extrusion*.5,extrusion*1.25-channelDeep/2+1]){
	    translate([0,-extrusion/2,0])cylinder(r=channelWidthInside/2, h= channelDeep,center=true);
	    cube([channelWidthInside, extrusion,channelDeep],center=true);
	}

    	rotate([0,0,-30])translate([1.3*extrusion,extrusion*.5,-extrusion*1.25+channelDeep/2-1]){
	    translate([0,-extrusion/2,0])cylinder(r=channelWidthInside/2, h= channelDeep,center=true);
	    cube([channelWidthInside, extrusion,channelDeep],center=true);
	}

	rotate([0,0,30])translate([-1.3*extrusion,extrusion*.5,extrusion*1.25-channelDeep/2+1]){
	    translate([0,-extrusion/2,0])cylinder(r=channelWidthInside/2, h= channelDeep,center=true);
	    cube([channelWidthInside, extrusion,channelDeep],center=true);
	}

    	rotate([0,0,30])translate([-1.3*extrusion,extrusion*.5,-extrusion*1.25+channelDeep/2-1]){
	    translate([0,-extrusion/2,0])cylinder(r=channelWidthInside/2, h= channelDeep,center=true);
	    cube([channelWidthInside, extrusion,channelDeep],center=true);
	}

	// screw holes for cover the bottom
	translate([0.9*extrusion, -1.4*extrusion,-extrusion*1.25]) cylinder(r=m3ScrewRadius, h=2*extrusion, center=true, $fn=20);
	translate([-0.9*extrusion, -1.4*extrusion,-extrusion*1.25]) cylinder(r=m3ScrewRadius, h=2*extrusion, center=true, $fn=20);


	translate([1.3*extrusion, -0.9*extrusion,-extrusion*1.25]) cylinder(r=m3ScrewRadius, h=2*extrusion, center=true, $fn=20);
	translate([-1.3*extrusion, -0.9*extrusion,-extrusion*1.25]) cylinder(r=m3ScrewRadius, h=2*extrusion, center=true, $fn=20);

	//sl0ts for wires
	translate([0.7*extrusion,-0.63*extrusion,-1.25*extrusion+channelDeep/2-1])cube([extrusion,channelWidth, channelDeep],center=true);
	translate([-0.7*extrusion,-0.63*extrusion,-1.25*extrusion+channelDeep/2-1])cube([extrusion,channelWidth, channelDeep],center=true);


	translate([0.7*extrusion,-1.07*extrusion,-1.25*extrusion+channelDeep/2-1]) rotate([0,0,45])
	cube([extrusion,channelWidth, channelDeep],center=true);
	
	translate([-0.7*extrusion,-1.07*extrusion,-1.25*extrusion+channelDeep/2-1]) rotate([0,0,-45])
	cube([extrusion,channelWidth, channelDeep],center=true);

	translate([0,0,-1.2*extrusion]) rotate([5,0,0])cube([0.5*extrusion,2*extrusion,0.2*extrusion],center=true);
	translate([0, extrusion, -1.1*extrusion]) rotate([10,0,0])cube([0.5*extrusion, extrusion*1.5, 0.2*extrusion],center=true);

	// side holes for wiring
	translate([-1.1*extrusion,extrusion,0]) cube([0.2*extrusion,2*extrusion,0.5*extrusion],center=true);
	translate([1.1*extrusion,extrusion,0]) cube([0.2*extrusion,2*extrusion,0.5*extrusion],center=true);

	translate([-1.7*extrusion,extrusion,0]) cube([0.2*extrusion,2*extrusion,0.5*extrusion],center=true);
	translate([1.7*extrusion,extrusion,0]) cube([0.2*extrusion,2*extrusion,0.5*extrusion],center=true);

	translate([-1.5*extrusion,1.7*extrusion,0.75*extrusion])rotate([0,0,-60]) cube([0.35*extrusion,2*extrusion,0.2*extrusion],center=true);
	translate([-1.5*extrusion,1.7*extrusion,-0.75*extrusion])rotate([0,0,-60]) cube([0.35*extrusion,2*extrusion,0.2*extrusion],center=true);

	translate([1.5*extrusion,1.7*extrusion,0.75*extrusion])rotate([0,0,60]) cube([0.35*extrusion,2*extrusion,0.2*extrusion],center=true);
	translate([1.5*extrusion,1.7*extrusion,-0.75*extrusion])rotate([0,0,60]) cube([0.35*extrusion,2*extrusion,0.2*extrusion],center=true);


	
	// Kossel XL logo
	translate([1.56*extrusion, -1.1*extrusion, 0])
	rotate([90, -90, 60])
	scale([0.09*extrusion/20, 0.15*extrusion/20, 0.8*extrusion/20]) import("logotype.stl");

	//structural holes
	rotate([0,0,-30])translate([1.3*extrusion,0,0.5*extrusion]){
	    cube([channelWidthInside, extrusion,0.5*extrusion],center=true);
	}

	rotate([0,0,-30])translate([1.3*extrusion,0,-0.5*extrusion]){
	    cube([channelWidthInside, extrusion,0.5*extrusion],center=true);
	}
	

	rotate([0,0,30])translate([-1.3*extrusion,0,0.5*extrusion]){
	    cube([channelWidthInside, extrusion,0.5*extrusion],center=true);
	}

	rotate([0,0,30])translate([-1.3*extrusion,0,-0.5*extrusion]){
	    cube([channelWidthInside, extrusion,0.5*extrusion],center=true);
	}


    }
}

//color("red") frame_motor();
color("grey")translate([0,0,-2.5*extrusion])bottomCover(extrusion);

//frame_top();
//translate([0,0,0.55*extrusion])topCover(extrusion*.3);
